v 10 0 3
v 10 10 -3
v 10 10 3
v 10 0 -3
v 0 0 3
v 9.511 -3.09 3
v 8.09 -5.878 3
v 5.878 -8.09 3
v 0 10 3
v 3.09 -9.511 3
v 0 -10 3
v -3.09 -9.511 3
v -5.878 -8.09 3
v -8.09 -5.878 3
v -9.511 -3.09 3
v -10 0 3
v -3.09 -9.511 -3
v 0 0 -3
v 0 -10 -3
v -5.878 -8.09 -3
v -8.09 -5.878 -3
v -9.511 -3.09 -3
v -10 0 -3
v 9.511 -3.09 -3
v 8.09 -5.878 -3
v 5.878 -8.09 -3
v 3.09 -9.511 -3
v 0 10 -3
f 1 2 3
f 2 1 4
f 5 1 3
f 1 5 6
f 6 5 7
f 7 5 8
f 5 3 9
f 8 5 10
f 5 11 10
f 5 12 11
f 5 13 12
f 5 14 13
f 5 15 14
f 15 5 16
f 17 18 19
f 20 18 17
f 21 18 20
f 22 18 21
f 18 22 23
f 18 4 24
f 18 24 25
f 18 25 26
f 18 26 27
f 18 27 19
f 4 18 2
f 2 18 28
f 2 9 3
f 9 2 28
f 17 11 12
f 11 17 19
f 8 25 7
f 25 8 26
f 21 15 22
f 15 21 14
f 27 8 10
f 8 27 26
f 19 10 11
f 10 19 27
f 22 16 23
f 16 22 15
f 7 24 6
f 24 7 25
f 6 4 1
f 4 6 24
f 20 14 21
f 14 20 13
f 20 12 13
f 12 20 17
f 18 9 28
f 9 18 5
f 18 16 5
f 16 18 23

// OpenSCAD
scale([1,1,0.6]) {
    translate([0,0,-5]) {
        difference() {
            union() {
                cube(10);
                cylinder(10, r=10, $fn = 20);
            }
            translate([-20,0,-5]) {
                cube(20);
            }
        }
    }
}
